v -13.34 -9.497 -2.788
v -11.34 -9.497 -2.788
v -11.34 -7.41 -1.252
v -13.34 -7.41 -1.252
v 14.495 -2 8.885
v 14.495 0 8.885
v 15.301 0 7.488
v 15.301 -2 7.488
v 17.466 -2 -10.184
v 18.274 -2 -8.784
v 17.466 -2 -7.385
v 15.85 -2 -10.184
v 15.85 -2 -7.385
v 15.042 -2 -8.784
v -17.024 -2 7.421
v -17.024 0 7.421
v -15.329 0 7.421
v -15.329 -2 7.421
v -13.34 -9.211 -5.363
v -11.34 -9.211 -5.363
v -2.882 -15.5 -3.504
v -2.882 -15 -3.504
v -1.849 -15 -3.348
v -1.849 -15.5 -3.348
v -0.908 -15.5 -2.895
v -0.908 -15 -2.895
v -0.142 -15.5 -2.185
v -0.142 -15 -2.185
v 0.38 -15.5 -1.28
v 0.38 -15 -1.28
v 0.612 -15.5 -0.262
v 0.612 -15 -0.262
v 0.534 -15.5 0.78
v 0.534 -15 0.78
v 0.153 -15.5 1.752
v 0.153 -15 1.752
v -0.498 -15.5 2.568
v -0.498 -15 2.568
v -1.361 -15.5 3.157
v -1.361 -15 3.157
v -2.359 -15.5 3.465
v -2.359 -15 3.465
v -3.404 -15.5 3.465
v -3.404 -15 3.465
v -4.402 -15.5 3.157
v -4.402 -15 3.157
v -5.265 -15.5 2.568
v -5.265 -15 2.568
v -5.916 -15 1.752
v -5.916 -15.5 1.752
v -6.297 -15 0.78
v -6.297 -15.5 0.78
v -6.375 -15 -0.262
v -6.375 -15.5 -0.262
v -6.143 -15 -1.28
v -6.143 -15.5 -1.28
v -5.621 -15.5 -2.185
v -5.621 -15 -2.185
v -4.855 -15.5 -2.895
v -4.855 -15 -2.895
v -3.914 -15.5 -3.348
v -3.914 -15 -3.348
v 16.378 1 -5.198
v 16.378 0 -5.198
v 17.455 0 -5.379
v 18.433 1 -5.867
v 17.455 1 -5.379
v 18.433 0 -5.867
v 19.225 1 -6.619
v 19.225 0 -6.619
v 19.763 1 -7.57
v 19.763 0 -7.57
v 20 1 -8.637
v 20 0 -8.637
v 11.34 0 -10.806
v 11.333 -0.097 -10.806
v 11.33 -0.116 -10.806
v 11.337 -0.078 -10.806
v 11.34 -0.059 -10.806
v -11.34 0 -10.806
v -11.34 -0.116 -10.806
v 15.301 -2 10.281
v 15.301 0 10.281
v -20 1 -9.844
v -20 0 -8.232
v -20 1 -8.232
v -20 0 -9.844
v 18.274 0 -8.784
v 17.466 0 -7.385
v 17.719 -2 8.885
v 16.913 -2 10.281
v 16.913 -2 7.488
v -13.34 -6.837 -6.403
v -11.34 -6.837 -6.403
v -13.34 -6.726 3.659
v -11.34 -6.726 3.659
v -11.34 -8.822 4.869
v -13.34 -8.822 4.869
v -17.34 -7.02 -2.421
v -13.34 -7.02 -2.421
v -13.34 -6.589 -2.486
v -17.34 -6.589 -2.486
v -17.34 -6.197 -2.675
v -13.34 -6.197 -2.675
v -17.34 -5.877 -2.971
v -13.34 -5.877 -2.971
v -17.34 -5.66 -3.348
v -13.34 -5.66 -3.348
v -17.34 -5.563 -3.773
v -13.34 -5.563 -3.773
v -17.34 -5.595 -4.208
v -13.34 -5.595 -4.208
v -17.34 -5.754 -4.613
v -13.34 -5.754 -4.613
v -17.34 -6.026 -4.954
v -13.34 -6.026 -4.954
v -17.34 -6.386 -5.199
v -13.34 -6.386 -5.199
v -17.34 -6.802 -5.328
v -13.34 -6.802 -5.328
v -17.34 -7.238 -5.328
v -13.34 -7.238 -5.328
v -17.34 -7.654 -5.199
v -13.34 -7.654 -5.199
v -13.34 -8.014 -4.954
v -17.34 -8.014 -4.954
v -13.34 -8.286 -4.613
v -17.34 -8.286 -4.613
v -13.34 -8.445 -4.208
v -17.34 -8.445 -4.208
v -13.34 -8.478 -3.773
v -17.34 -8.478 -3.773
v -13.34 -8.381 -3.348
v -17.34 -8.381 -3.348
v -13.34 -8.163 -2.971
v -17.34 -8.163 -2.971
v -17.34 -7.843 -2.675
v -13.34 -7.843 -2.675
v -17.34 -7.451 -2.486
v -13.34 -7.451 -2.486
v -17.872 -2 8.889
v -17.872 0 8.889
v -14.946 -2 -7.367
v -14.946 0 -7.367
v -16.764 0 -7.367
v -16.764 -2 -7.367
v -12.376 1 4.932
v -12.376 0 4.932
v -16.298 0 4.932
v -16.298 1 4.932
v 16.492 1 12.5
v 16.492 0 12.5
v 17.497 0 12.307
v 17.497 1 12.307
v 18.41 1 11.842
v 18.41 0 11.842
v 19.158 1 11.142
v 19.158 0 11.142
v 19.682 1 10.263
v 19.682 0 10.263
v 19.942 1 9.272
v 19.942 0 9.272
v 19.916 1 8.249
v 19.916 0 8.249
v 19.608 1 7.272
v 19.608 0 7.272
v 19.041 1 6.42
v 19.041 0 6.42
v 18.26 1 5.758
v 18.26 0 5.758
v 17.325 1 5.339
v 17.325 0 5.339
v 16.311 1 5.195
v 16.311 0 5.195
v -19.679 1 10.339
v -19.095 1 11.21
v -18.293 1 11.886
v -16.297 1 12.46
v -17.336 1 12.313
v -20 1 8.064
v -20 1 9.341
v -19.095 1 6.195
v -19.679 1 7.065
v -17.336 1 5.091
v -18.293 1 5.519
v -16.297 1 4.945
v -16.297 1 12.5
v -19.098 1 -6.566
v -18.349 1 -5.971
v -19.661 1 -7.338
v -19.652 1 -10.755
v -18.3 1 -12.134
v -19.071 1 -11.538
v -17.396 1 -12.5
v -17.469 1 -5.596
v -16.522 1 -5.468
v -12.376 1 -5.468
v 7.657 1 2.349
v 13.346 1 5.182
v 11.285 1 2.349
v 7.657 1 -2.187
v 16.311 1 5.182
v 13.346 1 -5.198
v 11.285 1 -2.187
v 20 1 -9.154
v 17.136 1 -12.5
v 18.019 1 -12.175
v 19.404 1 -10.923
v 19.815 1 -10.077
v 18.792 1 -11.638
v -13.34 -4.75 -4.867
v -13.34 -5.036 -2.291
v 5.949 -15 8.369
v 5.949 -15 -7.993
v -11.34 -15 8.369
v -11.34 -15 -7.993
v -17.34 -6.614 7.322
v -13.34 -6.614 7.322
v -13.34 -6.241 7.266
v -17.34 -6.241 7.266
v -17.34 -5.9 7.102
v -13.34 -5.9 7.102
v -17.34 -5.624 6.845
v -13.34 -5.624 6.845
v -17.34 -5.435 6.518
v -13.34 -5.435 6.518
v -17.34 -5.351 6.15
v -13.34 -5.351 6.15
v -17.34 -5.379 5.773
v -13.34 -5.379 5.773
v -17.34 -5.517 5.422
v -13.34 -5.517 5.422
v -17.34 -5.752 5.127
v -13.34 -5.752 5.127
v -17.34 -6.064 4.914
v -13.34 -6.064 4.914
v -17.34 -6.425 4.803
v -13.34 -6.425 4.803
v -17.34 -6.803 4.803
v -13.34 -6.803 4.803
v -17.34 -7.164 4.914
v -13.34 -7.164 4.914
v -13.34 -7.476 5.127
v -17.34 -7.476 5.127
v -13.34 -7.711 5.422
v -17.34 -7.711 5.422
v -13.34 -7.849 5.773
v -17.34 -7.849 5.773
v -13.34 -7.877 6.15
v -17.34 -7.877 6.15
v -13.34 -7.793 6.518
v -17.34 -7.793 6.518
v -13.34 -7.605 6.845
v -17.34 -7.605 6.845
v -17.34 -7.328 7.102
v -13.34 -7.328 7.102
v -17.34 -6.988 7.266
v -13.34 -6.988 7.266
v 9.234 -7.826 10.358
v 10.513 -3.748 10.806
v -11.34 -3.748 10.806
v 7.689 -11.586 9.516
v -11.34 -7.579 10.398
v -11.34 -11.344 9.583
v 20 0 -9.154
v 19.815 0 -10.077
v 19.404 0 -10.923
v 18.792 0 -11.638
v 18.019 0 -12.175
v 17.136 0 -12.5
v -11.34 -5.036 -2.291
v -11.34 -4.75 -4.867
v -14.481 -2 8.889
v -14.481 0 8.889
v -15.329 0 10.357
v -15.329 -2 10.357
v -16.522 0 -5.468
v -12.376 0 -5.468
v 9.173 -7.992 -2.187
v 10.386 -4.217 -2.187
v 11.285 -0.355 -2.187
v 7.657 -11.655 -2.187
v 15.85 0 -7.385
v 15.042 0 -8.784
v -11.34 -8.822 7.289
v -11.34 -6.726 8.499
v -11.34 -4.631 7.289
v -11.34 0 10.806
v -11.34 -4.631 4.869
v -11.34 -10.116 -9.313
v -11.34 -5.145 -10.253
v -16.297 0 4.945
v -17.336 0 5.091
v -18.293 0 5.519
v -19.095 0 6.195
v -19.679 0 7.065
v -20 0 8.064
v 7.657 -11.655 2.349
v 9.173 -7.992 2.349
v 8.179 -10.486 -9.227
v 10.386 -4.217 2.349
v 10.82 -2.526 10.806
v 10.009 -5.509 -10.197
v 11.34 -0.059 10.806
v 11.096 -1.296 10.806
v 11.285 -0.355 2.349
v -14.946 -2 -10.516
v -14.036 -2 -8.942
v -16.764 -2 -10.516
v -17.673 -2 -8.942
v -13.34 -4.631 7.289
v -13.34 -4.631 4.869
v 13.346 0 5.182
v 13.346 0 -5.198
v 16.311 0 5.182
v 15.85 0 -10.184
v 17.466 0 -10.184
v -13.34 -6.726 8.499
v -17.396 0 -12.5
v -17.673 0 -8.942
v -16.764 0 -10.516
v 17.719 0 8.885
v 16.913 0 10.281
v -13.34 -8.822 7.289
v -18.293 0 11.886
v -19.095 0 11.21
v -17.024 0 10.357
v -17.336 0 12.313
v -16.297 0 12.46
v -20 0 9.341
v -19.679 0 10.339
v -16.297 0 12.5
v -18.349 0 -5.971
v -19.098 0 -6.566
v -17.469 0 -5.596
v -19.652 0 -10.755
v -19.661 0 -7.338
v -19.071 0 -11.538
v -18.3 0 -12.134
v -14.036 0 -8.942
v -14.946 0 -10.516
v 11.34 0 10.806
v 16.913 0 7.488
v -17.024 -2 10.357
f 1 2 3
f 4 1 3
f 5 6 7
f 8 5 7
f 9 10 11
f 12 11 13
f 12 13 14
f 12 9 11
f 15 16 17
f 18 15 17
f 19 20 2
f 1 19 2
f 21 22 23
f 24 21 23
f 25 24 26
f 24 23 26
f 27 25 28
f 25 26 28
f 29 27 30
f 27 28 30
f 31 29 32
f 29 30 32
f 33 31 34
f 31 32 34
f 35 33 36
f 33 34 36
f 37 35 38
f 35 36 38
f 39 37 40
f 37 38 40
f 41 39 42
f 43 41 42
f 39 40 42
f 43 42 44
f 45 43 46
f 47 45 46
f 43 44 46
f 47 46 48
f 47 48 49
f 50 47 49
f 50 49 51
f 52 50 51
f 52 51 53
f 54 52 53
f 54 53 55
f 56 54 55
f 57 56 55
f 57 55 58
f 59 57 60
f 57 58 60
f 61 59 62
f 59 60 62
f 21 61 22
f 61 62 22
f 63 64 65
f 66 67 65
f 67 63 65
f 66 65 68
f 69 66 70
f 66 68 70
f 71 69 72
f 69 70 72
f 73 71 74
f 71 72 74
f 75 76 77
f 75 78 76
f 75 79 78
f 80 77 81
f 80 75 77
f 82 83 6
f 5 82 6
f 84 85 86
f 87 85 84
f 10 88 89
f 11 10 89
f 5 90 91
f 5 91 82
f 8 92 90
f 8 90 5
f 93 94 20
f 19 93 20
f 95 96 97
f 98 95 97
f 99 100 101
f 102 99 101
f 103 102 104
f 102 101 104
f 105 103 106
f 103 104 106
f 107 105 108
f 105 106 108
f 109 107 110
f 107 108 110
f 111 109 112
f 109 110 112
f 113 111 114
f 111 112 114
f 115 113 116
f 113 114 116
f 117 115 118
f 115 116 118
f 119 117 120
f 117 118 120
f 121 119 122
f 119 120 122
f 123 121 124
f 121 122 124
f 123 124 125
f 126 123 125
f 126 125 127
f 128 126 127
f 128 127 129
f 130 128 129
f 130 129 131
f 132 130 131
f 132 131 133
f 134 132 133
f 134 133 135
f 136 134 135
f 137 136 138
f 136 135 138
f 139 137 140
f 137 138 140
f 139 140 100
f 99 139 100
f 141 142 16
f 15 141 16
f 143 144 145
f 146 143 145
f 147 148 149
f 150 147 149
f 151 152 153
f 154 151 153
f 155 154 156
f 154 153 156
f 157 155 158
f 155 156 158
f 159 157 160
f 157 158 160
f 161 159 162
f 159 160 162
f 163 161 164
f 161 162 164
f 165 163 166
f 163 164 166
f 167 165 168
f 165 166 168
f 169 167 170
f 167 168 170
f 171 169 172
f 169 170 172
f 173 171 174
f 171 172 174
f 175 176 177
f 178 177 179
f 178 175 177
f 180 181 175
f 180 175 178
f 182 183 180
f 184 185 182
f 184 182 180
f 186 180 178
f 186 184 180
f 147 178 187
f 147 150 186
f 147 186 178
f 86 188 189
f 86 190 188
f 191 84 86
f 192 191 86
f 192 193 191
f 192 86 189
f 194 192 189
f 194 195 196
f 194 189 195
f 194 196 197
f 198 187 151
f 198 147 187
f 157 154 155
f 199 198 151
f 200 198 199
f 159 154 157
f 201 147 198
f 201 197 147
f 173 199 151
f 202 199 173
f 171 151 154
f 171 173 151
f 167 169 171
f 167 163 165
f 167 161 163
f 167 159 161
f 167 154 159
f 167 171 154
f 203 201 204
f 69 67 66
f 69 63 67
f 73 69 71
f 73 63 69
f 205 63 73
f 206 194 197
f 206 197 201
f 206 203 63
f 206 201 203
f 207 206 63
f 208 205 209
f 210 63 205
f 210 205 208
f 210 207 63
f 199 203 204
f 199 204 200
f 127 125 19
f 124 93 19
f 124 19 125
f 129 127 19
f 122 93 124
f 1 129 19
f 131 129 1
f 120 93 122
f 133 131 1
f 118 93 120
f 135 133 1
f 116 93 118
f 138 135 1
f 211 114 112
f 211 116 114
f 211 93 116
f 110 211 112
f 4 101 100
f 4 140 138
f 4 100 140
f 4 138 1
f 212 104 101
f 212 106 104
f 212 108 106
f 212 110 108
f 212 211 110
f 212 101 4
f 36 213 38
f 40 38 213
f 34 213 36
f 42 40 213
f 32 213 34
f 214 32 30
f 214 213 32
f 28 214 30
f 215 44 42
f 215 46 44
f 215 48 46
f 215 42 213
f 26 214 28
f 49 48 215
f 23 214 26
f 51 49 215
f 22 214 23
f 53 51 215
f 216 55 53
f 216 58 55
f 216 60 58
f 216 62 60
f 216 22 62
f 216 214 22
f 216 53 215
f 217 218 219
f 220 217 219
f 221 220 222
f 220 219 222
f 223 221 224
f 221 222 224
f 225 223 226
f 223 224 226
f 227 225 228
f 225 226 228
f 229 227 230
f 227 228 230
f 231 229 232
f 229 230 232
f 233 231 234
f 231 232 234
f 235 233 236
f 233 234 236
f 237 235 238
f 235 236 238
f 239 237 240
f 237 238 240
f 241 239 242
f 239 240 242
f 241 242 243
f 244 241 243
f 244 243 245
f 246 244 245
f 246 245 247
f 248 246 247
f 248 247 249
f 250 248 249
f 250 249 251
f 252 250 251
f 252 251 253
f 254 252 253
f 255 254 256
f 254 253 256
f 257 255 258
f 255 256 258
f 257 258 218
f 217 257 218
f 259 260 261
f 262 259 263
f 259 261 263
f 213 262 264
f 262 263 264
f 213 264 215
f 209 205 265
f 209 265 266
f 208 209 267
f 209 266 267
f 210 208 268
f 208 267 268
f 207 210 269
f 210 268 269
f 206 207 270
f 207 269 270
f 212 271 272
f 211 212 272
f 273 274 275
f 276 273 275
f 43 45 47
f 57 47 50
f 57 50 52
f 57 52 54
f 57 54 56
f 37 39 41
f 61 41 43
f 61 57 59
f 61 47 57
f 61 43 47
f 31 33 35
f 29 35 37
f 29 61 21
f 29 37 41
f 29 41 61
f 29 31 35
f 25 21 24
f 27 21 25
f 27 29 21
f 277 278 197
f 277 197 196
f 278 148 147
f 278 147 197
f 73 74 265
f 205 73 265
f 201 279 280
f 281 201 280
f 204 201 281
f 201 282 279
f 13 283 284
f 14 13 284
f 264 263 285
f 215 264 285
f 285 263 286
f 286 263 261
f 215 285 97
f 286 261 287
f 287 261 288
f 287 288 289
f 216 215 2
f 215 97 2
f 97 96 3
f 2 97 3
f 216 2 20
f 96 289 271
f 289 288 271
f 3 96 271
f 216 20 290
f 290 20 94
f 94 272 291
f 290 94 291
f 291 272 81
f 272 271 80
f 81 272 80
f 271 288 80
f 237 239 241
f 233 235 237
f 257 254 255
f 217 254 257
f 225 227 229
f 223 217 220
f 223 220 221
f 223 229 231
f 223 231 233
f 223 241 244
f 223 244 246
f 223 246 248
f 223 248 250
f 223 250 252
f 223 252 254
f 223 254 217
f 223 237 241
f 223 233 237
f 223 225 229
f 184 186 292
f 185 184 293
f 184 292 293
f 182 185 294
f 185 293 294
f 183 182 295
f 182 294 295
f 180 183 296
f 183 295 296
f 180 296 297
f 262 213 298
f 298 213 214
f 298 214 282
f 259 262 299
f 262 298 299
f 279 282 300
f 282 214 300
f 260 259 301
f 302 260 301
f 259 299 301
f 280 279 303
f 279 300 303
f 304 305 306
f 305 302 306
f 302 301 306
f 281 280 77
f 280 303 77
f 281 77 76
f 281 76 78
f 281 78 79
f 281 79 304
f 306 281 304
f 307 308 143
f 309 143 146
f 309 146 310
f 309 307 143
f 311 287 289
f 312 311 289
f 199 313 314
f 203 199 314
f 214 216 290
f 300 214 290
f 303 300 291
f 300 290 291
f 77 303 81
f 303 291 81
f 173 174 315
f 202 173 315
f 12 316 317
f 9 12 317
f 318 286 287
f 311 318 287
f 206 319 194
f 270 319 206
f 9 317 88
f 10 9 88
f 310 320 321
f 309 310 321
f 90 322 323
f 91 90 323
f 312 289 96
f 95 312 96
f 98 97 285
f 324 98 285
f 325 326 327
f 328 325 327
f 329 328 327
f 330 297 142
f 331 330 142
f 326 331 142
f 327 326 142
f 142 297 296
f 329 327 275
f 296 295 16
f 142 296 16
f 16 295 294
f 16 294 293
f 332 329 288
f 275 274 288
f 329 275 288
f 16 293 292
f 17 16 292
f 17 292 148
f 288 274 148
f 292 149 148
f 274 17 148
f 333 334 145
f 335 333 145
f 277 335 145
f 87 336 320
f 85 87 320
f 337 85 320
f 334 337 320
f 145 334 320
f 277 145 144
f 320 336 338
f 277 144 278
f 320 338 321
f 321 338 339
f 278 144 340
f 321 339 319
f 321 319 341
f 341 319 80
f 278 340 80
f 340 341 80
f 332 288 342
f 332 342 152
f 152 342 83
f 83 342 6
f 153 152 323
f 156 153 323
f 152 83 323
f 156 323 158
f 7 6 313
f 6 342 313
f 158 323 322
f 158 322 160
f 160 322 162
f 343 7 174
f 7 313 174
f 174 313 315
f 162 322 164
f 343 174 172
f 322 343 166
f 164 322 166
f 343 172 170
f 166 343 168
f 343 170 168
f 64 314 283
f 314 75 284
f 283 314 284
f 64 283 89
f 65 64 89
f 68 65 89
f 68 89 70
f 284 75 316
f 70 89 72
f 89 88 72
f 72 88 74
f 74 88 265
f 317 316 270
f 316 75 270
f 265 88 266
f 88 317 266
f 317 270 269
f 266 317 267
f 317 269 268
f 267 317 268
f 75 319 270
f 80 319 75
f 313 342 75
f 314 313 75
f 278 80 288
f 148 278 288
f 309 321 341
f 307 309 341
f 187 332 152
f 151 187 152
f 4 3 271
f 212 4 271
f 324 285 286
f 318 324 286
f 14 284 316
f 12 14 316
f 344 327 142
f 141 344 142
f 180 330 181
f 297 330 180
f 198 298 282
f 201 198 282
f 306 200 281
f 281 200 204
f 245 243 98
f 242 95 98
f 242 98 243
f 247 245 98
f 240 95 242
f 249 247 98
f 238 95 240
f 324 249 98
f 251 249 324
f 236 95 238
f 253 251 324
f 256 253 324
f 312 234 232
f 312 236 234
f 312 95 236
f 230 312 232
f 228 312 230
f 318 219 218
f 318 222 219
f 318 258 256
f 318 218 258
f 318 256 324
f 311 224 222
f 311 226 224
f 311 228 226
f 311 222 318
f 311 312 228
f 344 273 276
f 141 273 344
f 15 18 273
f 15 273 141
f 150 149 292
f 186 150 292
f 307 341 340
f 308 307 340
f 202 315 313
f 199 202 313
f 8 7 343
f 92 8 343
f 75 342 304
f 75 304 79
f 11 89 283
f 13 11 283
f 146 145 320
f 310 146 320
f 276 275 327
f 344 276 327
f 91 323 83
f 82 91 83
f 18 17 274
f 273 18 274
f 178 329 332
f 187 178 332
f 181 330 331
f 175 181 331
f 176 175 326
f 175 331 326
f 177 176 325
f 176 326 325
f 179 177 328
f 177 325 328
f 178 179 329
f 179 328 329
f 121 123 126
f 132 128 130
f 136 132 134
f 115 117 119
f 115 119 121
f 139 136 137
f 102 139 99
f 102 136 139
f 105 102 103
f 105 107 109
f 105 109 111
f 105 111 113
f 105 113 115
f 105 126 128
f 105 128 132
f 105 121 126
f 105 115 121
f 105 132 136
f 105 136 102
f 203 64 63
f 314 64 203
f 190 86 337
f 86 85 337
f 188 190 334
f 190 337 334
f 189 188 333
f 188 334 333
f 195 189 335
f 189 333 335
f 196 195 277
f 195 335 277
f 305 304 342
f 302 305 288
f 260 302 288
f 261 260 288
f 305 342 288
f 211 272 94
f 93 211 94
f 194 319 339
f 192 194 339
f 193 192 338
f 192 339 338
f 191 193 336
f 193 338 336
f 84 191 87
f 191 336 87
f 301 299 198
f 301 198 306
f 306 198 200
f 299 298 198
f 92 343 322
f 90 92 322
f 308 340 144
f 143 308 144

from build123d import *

# Parameters (mm, degrees)
SKETCH2_W            = 40
SKETCH2_H            = 25
BOSS_EXTRUDE2_DEPTH  = 1
CUT_EXTRUDE1_DEPTH   = 24.606143268
SKETCH5_W            = 3.048166118
SKETCH5_H            = 10.380355358
CUT_EXTRUDE4_DEPTH   = 1
CUT_EXTRUDE5_DEPTH   = 24.606143268
SKETCH7_W            = 4.145565418
SKETCH7_H            = 10.399948371
CUT_EXTRUDE7_DEPTH   = 24.606143268
SKETCH8_W            = 22.680519054
SKETCH8_H            = 21.612113122
BOSS_EXTRUDE3_DEPTH  = 15
CUT_EXTRUDE8_DEPTH   = 30
CUT_EXTRUDE9_DEPTH   = 30
CUT_EXTRUDE10_DEPTH  = 30
SKETCH12_W           = 3.628157273
SKETCH12_H           = 4.536406583
CUT_EXTRUDE11_DEPTH  = 29.500000056
BOSS_EXTRUDE4_DEPTH  = 2
BOSS_EXTRUDE5_DEPTH  = 2
BOSS_EXTRUDE6_DEPTH  = 2
BOSS_EXTRUDE7_DEPTH  = 2
SKETCH17_R           = 3.503719222
BOSS_EXTRUDE8_DEPTH  = 0.5
BOSS_EXTRUDE9_DEPTH  = 2
BOSS_EXTRUDE10_DEPTH = 2
SKETCH20_R           = 1.26687785
BOSS_EXTRUDE11_DEPTH = 4
SKETCH21_R           = 1.46158904
BOSS_EXTRUDE12_DEPTH = 4


with BuildPart() as part:
    # Sketch2 → Boss-Extrude2 (new body)
    with BuildSketch(Plane(origin=(0, 0, 0), x_dir=(1, 0, 0), z_dir=(0, 1, 0))):
        Rectangle(SKETCH2_W, SKETCH2_H)
    extrude(amount=BOSS_EXTRUDE2_DEPTH)

    # Sketch4 → Cut-Extrude1 (cut, through all)
    with BuildSketch(Plane(origin=(0, 0, 0), x_dir=(-1, 0, 0), z_dir=(0, -1, 0))):
        with BuildLine():
            Line((-16.311436799, -5.195321305), (-16.311436799, 5.197856111))
            ThreePointArc((-16.311436799, 5.197856111), (-20.005849228, 9.049958295), (-16.002782134, 12.580231412))
            Line((-16.002782134, 12.580231412), (-16.034433084, 14.57463247))
            Line((-16.034433084, 14.57463247), (-22.167227524, 14.47730562))
            Line((-22.167227524, 14.47730562), (-21.947479334, -14.537250164))
            Line((-21.947479334, -14.537250164), (-16.200353352, -14.798286616))
            Line((-16.200353352, -14.798286616), (-16.311436799, -12.504458481))
            ThreePointArc((-16.311436799, -12.504458481), (-19.966005387, -8.849889893), (-16.311436799, -5.195321305))
        make_face()
    extrude(amount=-CUT_EXTRUDE1_DEPTH, mode=Mode.SUBTRACT)

    # Sketch5 → Cut-Extrude4 (cut)
    with BuildSketch(Plane(origin=(0, 0, 0), x_dir=(-1, 0, 0), z_dir=(0, -1, 0))):
        with Locations((-14.87035518, 0.008277846)):
            Rectangle(SKETCH5_W, SKETCH5_H)
    extrude(amount=-CUT_EXTRUDE4_DEPTH, mode=Mode.SUBTRACT)

    # Sketch6 → Cut-Extrude5 (cut, through all)
    with BuildSketch(Plane(origin=(0, 0, 0), x_dir=(-1, 0, 0), z_dir=(0, -1, 0))):
        with BuildLine():
            Line((16.521680561, 5.46762026), (16.29742638, -4.945125741))
            ThreePointArc((16.29742638, -4.945125741), (20.054665472, -8.702364833), (16.29742638, -12.459603925))
            Line((16.29742638, -12.459603925), (16.29742638, -15.143532095))
            Line((16.29742638, -15.143532095), (29.009035652, -15.661685945))
            Line((29.009035652, -15.661685945), (29.009035652, -13.80156801))
            Line((29.009035652, -13.80156801), (27.951962111, 14.649001906))
            Line((27.951962111, 14.649001906), (18.760629252, 18.072251543))
            Line((18.760629252, 18.072251543), (16.723599762, 12.602882354))
            ThreePointArc((16.723599762, 12.602882354), (20.090739839, 8.937108322), (16.521680561, 5.46762026))
        make_face()
    extrude(amount=-CUT_EXTRUDE5_DEPTH, mode=Mode.SUBTRACT)

    # Sketch7 → Cut-Extrude7 (cut, through all)
    with BuildSketch(Plane(origin=(0, 0, 0), x_dir=(-1, 0, 0), z_dir=(0, -1, 0))):
        with Locations((14.448897852, 0.267646074)):
            Rectangle(SKETCH7_W, SKETCH7_H)
    extrude(amount=-CUT_EXTRUDE7_DEPTH, mode=Mode.SUBTRACT)

    # Sketch8 → Boss-Extrude3 (add)
    with BuildSketch(Plane(origin=(0, 0, 0), x_dir=(-1, 0, 0), z_dir=(0, -1, 0))):
        Rectangle(SKETCH8_W, SKETCH8_H)
    extrude(amount=BOSS_EXTRUDE3_DEPTH)

    # Sketch9 → Cut-Extrude8 (cut)
    with BuildSketch(Plane(origin=(0, 0, -10.806056561), x_dir=(-1, 0, 0), z_dir=(0, 0, -1))):
        with BuildLine():
            Line((-11.340259527, -15), (-5.948771171, -15))
            ThreePointArc((-5.948771171, -15), (-9.260644908, -7.752061524), (-11.340259527, -0.059446699))
            Line((-11.340259527, -0.059446699), (-11.340259527, -15))
        make_face()
    extrude(amount=-CUT_EXTRUDE8_DEPTH, mode=Mode.SUBTRACT)

    # Sketch10 → Cut-Extrude9 (cut)
    with BuildSketch(Plane.ZY.offset(11.340259527)):
        with BuildLine():
            Line((-10.806056561, -15), (-7.993035408, -15))
            ThreePointArc((-7.993035408, -15), (-9.83110735, -7.639316506), (-10.806056561, -0.115511352))
            Line((-10.806056561, -0.115511352), (-10.806056561, -15))
        make_face()
    extrude(amount=-CUT_EXTRUDE9_DEPTH, mode=Mode.SUBTRACT)

    # Sketch11 → Cut-Extrude10 (cut)
    with BuildSketch(Plane.ZY.offset(11.340259527)):
        with BuildLine():
            ThreePointArc((10.806056561, -3.748163783), (10.041226218, -9.472321419), (8.369186868, -15))
            Line((8.369186868, -15), (10.806056561, -15))
            Line((10.806056561, -15), (10.806056561, -3.748163783))
        make_face()
    extrude(amount=-CUT_EXTRUDE10_DEPTH, mode=Mode.SUBTRACT)

    # Sketch12 → Cut-Extrude11 (cut, through all)
    with BuildSketch(Plane(origin=(0, 1, 0), x_dir=(1, 0, 0), z_dir=(0, 1, 0))):
        with Locations((9.470946216, -0.081192325)):
            Rectangle(SKETCH12_W, SKETCH12_H)
    extrude(amount=-CUT_EXTRUDE11_DEPTH, mode=Mode.SUBTRACT)

    # Sketch13 → Boss-Extrude4 (add)
    with BuildSketch(Plane(origin=(0, 0, 0), x_dir=(-1, 0, 0), z_dir=(0, -1, 0))):
        Polygon((-14.494931401, -8.884648292), (-15.301061446, -7.488390096), (-16.913321537, -7.488390096), (-17.719451582, -8.884648292), (-16.913321537, -10.280906489), (-15.301061446, -10.280906489), align=None)
    extrude(amount=BOSS_EXTRUDE4_DEPTH)

    # Sketch14 → Boss-Extrude5 (add)
    with BuildSketch(Plane(origin=(0, 0, 0), x_dir=(-1, 0, 0), z_dir=(0, -1, 0))):
        Polygon((-15.042408021, 8.784141367), (-15.850363425, 10.183561177), (-17.466274234, 10.183561177), (-18.274229638, 8.784141367), (-17.466274234, 7.384721557), (-15.850363425, 7.384721557), align=None)
    extrude(amount=BOSS_EXTRUDE5_DEPTH)

    # Sketch15 → Boss-Extrude6 (add)
    with BuildSketch(Plane(origin=(0, 0, 0), x_dir=(-1, 0, 0), z_dir=(0, -1, 0))):
        Polygon((17.871524181, -8.889197459), (17.023921653, -7.421106816), (15.328716596, -7.421106816), (14.481114068, -8.889197459), (15.328716596, -10.357288103), (17.023921653, -10.357288103), align=None)
    extrude(amount=BOSS_EXTRUDE6_DEPTH)

    # Sketch16 → Boss-Extrude7 (add)
    with BuildSketch(Plane(origin=(0, 0, 0), x_dir=(-1, 0, 0), z_dir=(0, -1, 0))):
        Polygon((17.673273489, 8.94154839), (16.76404939, 10.516370724), (14.945601192, 10.516370724), (14.036377093, 8.94154839), (14.945601192, 7.366726055), (16.76404939, 7.366726055), align=None)
    extrude(amount=BOSS_EXTRUDE7_DEPTH)

    # Sketch17 → Boss-Extrude8 (add)
    with BuildSketch(Plane(origin=(0, -15, 0), x_dir=(-1, 0, 0), z_dir=(0, -1, 0))):
        with Locations(Location((2.881571025, 0, 0), (0, 0, 90))):
            Circle(SKETCH17_R)
    extrude(amount=BOSS_EXTRUDE8_DEPTH)

    # Sketch18 → Boss-Extrude9 (add)
    with BuildSketch(Plane.ZY.offset(11.340259527)):
        Polygon((3.659390597, -6.726148666), (4.869302964, -8.821778359), (7.2891277, -8.821778359), (8.499040067, -6.726148666), (7.2891277, -4.630518972), (4.869302964, -4.630518972), align=None)
    extrude(amount=BOSS_EXTRUDE9_DEPTH)

    # Sketch19 → Boss-Extrude10 (add)
    with BuildSketch(Plane.ZY.offset(11.340259527)):
        Polygon((-6.402752553, -6.836831629), (-5.363301958, -9.210722079), (-2.787727224, -9.497476683), (-1.251603086, -7.410340836), (-2.291053681, -5.036450385), (-4.866628415, -4.749695782), align=None)
    extrude(amount=BOSS_EXTRUDE10_DEPTH)

    # Sketch20 → Boss-Extrude11 (add)
    with BuildSketch(Plane.ZY.offset(13.340259527)):
        with Locations((6.055236467, -6.614121956)):
            Circle(SKETCH20_R)
    extrude(amount=BOSS_EXTRUDE11_DEPTH)

    # Sketch21 → Boss-Extrude12 (add)
    with BuildSketch(Plane.ZY.offset(13.340259527)):
        with Locations((-3.88229524, -7.020150319)):
            Circle(SKETCH21_R)
    extrude(amount=BOSS_EXTRUDE12_DEPTH)


solid = part.part
